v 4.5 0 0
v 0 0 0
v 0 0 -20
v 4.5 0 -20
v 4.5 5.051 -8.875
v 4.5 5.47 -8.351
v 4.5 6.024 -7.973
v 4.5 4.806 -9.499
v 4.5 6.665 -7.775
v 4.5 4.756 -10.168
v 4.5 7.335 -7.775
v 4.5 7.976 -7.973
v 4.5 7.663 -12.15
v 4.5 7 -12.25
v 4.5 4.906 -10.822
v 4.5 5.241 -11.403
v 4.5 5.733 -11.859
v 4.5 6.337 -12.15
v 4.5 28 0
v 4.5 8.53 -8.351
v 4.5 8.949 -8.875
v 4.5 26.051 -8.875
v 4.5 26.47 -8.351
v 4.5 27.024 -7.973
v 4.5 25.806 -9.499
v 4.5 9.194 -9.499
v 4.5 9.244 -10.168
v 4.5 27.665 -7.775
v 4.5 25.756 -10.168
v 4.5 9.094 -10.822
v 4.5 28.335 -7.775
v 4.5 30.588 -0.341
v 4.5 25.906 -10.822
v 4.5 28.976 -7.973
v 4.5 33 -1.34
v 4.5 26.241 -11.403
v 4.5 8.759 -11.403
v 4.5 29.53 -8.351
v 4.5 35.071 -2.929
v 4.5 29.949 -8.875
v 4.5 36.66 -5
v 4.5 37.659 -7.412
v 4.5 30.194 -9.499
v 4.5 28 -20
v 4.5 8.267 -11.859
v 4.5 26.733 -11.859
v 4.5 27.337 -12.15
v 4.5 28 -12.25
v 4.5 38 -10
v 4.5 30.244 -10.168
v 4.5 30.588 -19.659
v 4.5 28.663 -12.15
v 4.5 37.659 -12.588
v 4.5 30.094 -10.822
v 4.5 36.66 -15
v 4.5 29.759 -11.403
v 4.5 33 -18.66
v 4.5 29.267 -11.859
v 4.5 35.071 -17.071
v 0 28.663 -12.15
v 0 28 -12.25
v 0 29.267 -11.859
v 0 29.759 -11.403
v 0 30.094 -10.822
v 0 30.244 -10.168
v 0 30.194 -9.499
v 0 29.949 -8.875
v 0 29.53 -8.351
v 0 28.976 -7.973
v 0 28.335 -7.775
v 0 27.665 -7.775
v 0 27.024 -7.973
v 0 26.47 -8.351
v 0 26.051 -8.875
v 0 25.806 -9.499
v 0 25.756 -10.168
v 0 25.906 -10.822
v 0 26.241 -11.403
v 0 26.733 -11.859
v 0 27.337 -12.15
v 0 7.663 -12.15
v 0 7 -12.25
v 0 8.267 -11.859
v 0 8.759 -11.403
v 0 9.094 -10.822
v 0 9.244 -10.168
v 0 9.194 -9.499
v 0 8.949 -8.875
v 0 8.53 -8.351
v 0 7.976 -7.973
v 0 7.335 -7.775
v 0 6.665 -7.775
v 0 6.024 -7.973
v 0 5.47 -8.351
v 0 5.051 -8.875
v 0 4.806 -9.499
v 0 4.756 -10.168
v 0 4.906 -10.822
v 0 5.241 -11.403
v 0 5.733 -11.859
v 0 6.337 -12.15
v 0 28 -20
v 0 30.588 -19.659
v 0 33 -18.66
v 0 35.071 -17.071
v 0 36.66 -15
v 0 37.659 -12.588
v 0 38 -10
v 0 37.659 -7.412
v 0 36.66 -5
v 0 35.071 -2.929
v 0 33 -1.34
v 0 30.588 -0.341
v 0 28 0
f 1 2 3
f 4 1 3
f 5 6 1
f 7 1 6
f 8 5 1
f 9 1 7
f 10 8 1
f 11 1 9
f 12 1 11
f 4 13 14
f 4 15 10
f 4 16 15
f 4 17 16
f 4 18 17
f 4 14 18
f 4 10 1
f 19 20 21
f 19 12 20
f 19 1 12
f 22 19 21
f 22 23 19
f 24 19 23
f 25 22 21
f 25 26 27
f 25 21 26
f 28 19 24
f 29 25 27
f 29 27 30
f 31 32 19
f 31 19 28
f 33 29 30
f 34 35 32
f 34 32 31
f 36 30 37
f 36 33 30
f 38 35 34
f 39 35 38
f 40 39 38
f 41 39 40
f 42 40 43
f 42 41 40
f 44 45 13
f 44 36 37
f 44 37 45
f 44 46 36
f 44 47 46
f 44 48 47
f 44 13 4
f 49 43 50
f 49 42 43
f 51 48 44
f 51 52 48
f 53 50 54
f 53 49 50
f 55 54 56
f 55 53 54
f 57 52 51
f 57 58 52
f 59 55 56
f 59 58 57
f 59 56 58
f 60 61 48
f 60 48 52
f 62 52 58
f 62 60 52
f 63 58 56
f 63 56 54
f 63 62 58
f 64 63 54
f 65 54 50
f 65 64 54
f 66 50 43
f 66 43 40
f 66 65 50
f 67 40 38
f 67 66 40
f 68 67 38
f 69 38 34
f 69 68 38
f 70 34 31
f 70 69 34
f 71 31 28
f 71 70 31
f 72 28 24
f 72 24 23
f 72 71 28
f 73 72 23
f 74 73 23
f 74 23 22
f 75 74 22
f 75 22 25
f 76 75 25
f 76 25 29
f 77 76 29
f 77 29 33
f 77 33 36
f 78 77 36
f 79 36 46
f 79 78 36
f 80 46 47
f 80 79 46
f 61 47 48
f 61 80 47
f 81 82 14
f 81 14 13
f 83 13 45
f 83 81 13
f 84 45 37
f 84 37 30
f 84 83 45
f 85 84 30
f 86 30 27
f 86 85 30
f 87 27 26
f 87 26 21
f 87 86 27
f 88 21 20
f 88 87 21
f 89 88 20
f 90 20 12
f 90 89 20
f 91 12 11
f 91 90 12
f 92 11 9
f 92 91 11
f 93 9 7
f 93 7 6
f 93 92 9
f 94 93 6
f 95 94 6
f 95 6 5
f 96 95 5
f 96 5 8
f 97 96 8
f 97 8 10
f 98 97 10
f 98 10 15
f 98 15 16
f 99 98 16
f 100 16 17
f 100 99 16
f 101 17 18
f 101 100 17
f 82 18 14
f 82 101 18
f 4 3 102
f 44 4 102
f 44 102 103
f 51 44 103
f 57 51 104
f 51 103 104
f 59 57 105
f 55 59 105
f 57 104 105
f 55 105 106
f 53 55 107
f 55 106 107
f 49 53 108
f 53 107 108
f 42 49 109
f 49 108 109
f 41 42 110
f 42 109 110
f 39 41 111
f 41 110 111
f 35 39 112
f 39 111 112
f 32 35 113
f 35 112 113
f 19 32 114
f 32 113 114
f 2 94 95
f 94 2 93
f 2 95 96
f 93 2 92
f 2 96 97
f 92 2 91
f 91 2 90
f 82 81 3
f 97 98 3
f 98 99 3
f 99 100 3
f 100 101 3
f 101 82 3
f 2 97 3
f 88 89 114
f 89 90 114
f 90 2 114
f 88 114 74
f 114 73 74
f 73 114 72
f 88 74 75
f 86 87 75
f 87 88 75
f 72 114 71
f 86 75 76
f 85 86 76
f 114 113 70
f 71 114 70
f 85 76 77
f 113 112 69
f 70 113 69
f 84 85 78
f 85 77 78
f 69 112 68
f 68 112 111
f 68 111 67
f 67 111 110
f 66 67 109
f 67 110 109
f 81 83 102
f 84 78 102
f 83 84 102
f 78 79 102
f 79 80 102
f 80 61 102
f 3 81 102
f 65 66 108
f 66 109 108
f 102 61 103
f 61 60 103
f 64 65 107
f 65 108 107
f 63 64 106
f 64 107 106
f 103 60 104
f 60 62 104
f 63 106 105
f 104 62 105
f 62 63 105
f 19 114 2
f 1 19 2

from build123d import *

# Parameters (mm, degrees)
SKETCH_1_R      = 2.25
EXTRUDE_1_DEPTH = 4.5


with BuildPart() as part:
    # 草图1 → 凸台-拉伸1 (new body)
    with BuildSketch(Plane(origin=(0, 0, 0), x_dir=(0, 0, -1), z_dir=(1, 0, 0))):
        with BuildLine():
            Line((0, 0), (20, 0))
            Line((20, 0), (20, 28))
            ThreePointArc((20, 28), (10, 38), (0, 28))
            Line((0, 28), (0, 0))
        make_face()
        with Locations((10, 28)):
            Circle(SKETCH_1_R, mode=Mode.SUBTRACT)
        with Locations((10, 7)):
            Circle(SKETCH_1_R, mode=Mode.SUBTRACT)
    extrude(amount=EXTRUDE_1_DEPTH)


solid = part.part
